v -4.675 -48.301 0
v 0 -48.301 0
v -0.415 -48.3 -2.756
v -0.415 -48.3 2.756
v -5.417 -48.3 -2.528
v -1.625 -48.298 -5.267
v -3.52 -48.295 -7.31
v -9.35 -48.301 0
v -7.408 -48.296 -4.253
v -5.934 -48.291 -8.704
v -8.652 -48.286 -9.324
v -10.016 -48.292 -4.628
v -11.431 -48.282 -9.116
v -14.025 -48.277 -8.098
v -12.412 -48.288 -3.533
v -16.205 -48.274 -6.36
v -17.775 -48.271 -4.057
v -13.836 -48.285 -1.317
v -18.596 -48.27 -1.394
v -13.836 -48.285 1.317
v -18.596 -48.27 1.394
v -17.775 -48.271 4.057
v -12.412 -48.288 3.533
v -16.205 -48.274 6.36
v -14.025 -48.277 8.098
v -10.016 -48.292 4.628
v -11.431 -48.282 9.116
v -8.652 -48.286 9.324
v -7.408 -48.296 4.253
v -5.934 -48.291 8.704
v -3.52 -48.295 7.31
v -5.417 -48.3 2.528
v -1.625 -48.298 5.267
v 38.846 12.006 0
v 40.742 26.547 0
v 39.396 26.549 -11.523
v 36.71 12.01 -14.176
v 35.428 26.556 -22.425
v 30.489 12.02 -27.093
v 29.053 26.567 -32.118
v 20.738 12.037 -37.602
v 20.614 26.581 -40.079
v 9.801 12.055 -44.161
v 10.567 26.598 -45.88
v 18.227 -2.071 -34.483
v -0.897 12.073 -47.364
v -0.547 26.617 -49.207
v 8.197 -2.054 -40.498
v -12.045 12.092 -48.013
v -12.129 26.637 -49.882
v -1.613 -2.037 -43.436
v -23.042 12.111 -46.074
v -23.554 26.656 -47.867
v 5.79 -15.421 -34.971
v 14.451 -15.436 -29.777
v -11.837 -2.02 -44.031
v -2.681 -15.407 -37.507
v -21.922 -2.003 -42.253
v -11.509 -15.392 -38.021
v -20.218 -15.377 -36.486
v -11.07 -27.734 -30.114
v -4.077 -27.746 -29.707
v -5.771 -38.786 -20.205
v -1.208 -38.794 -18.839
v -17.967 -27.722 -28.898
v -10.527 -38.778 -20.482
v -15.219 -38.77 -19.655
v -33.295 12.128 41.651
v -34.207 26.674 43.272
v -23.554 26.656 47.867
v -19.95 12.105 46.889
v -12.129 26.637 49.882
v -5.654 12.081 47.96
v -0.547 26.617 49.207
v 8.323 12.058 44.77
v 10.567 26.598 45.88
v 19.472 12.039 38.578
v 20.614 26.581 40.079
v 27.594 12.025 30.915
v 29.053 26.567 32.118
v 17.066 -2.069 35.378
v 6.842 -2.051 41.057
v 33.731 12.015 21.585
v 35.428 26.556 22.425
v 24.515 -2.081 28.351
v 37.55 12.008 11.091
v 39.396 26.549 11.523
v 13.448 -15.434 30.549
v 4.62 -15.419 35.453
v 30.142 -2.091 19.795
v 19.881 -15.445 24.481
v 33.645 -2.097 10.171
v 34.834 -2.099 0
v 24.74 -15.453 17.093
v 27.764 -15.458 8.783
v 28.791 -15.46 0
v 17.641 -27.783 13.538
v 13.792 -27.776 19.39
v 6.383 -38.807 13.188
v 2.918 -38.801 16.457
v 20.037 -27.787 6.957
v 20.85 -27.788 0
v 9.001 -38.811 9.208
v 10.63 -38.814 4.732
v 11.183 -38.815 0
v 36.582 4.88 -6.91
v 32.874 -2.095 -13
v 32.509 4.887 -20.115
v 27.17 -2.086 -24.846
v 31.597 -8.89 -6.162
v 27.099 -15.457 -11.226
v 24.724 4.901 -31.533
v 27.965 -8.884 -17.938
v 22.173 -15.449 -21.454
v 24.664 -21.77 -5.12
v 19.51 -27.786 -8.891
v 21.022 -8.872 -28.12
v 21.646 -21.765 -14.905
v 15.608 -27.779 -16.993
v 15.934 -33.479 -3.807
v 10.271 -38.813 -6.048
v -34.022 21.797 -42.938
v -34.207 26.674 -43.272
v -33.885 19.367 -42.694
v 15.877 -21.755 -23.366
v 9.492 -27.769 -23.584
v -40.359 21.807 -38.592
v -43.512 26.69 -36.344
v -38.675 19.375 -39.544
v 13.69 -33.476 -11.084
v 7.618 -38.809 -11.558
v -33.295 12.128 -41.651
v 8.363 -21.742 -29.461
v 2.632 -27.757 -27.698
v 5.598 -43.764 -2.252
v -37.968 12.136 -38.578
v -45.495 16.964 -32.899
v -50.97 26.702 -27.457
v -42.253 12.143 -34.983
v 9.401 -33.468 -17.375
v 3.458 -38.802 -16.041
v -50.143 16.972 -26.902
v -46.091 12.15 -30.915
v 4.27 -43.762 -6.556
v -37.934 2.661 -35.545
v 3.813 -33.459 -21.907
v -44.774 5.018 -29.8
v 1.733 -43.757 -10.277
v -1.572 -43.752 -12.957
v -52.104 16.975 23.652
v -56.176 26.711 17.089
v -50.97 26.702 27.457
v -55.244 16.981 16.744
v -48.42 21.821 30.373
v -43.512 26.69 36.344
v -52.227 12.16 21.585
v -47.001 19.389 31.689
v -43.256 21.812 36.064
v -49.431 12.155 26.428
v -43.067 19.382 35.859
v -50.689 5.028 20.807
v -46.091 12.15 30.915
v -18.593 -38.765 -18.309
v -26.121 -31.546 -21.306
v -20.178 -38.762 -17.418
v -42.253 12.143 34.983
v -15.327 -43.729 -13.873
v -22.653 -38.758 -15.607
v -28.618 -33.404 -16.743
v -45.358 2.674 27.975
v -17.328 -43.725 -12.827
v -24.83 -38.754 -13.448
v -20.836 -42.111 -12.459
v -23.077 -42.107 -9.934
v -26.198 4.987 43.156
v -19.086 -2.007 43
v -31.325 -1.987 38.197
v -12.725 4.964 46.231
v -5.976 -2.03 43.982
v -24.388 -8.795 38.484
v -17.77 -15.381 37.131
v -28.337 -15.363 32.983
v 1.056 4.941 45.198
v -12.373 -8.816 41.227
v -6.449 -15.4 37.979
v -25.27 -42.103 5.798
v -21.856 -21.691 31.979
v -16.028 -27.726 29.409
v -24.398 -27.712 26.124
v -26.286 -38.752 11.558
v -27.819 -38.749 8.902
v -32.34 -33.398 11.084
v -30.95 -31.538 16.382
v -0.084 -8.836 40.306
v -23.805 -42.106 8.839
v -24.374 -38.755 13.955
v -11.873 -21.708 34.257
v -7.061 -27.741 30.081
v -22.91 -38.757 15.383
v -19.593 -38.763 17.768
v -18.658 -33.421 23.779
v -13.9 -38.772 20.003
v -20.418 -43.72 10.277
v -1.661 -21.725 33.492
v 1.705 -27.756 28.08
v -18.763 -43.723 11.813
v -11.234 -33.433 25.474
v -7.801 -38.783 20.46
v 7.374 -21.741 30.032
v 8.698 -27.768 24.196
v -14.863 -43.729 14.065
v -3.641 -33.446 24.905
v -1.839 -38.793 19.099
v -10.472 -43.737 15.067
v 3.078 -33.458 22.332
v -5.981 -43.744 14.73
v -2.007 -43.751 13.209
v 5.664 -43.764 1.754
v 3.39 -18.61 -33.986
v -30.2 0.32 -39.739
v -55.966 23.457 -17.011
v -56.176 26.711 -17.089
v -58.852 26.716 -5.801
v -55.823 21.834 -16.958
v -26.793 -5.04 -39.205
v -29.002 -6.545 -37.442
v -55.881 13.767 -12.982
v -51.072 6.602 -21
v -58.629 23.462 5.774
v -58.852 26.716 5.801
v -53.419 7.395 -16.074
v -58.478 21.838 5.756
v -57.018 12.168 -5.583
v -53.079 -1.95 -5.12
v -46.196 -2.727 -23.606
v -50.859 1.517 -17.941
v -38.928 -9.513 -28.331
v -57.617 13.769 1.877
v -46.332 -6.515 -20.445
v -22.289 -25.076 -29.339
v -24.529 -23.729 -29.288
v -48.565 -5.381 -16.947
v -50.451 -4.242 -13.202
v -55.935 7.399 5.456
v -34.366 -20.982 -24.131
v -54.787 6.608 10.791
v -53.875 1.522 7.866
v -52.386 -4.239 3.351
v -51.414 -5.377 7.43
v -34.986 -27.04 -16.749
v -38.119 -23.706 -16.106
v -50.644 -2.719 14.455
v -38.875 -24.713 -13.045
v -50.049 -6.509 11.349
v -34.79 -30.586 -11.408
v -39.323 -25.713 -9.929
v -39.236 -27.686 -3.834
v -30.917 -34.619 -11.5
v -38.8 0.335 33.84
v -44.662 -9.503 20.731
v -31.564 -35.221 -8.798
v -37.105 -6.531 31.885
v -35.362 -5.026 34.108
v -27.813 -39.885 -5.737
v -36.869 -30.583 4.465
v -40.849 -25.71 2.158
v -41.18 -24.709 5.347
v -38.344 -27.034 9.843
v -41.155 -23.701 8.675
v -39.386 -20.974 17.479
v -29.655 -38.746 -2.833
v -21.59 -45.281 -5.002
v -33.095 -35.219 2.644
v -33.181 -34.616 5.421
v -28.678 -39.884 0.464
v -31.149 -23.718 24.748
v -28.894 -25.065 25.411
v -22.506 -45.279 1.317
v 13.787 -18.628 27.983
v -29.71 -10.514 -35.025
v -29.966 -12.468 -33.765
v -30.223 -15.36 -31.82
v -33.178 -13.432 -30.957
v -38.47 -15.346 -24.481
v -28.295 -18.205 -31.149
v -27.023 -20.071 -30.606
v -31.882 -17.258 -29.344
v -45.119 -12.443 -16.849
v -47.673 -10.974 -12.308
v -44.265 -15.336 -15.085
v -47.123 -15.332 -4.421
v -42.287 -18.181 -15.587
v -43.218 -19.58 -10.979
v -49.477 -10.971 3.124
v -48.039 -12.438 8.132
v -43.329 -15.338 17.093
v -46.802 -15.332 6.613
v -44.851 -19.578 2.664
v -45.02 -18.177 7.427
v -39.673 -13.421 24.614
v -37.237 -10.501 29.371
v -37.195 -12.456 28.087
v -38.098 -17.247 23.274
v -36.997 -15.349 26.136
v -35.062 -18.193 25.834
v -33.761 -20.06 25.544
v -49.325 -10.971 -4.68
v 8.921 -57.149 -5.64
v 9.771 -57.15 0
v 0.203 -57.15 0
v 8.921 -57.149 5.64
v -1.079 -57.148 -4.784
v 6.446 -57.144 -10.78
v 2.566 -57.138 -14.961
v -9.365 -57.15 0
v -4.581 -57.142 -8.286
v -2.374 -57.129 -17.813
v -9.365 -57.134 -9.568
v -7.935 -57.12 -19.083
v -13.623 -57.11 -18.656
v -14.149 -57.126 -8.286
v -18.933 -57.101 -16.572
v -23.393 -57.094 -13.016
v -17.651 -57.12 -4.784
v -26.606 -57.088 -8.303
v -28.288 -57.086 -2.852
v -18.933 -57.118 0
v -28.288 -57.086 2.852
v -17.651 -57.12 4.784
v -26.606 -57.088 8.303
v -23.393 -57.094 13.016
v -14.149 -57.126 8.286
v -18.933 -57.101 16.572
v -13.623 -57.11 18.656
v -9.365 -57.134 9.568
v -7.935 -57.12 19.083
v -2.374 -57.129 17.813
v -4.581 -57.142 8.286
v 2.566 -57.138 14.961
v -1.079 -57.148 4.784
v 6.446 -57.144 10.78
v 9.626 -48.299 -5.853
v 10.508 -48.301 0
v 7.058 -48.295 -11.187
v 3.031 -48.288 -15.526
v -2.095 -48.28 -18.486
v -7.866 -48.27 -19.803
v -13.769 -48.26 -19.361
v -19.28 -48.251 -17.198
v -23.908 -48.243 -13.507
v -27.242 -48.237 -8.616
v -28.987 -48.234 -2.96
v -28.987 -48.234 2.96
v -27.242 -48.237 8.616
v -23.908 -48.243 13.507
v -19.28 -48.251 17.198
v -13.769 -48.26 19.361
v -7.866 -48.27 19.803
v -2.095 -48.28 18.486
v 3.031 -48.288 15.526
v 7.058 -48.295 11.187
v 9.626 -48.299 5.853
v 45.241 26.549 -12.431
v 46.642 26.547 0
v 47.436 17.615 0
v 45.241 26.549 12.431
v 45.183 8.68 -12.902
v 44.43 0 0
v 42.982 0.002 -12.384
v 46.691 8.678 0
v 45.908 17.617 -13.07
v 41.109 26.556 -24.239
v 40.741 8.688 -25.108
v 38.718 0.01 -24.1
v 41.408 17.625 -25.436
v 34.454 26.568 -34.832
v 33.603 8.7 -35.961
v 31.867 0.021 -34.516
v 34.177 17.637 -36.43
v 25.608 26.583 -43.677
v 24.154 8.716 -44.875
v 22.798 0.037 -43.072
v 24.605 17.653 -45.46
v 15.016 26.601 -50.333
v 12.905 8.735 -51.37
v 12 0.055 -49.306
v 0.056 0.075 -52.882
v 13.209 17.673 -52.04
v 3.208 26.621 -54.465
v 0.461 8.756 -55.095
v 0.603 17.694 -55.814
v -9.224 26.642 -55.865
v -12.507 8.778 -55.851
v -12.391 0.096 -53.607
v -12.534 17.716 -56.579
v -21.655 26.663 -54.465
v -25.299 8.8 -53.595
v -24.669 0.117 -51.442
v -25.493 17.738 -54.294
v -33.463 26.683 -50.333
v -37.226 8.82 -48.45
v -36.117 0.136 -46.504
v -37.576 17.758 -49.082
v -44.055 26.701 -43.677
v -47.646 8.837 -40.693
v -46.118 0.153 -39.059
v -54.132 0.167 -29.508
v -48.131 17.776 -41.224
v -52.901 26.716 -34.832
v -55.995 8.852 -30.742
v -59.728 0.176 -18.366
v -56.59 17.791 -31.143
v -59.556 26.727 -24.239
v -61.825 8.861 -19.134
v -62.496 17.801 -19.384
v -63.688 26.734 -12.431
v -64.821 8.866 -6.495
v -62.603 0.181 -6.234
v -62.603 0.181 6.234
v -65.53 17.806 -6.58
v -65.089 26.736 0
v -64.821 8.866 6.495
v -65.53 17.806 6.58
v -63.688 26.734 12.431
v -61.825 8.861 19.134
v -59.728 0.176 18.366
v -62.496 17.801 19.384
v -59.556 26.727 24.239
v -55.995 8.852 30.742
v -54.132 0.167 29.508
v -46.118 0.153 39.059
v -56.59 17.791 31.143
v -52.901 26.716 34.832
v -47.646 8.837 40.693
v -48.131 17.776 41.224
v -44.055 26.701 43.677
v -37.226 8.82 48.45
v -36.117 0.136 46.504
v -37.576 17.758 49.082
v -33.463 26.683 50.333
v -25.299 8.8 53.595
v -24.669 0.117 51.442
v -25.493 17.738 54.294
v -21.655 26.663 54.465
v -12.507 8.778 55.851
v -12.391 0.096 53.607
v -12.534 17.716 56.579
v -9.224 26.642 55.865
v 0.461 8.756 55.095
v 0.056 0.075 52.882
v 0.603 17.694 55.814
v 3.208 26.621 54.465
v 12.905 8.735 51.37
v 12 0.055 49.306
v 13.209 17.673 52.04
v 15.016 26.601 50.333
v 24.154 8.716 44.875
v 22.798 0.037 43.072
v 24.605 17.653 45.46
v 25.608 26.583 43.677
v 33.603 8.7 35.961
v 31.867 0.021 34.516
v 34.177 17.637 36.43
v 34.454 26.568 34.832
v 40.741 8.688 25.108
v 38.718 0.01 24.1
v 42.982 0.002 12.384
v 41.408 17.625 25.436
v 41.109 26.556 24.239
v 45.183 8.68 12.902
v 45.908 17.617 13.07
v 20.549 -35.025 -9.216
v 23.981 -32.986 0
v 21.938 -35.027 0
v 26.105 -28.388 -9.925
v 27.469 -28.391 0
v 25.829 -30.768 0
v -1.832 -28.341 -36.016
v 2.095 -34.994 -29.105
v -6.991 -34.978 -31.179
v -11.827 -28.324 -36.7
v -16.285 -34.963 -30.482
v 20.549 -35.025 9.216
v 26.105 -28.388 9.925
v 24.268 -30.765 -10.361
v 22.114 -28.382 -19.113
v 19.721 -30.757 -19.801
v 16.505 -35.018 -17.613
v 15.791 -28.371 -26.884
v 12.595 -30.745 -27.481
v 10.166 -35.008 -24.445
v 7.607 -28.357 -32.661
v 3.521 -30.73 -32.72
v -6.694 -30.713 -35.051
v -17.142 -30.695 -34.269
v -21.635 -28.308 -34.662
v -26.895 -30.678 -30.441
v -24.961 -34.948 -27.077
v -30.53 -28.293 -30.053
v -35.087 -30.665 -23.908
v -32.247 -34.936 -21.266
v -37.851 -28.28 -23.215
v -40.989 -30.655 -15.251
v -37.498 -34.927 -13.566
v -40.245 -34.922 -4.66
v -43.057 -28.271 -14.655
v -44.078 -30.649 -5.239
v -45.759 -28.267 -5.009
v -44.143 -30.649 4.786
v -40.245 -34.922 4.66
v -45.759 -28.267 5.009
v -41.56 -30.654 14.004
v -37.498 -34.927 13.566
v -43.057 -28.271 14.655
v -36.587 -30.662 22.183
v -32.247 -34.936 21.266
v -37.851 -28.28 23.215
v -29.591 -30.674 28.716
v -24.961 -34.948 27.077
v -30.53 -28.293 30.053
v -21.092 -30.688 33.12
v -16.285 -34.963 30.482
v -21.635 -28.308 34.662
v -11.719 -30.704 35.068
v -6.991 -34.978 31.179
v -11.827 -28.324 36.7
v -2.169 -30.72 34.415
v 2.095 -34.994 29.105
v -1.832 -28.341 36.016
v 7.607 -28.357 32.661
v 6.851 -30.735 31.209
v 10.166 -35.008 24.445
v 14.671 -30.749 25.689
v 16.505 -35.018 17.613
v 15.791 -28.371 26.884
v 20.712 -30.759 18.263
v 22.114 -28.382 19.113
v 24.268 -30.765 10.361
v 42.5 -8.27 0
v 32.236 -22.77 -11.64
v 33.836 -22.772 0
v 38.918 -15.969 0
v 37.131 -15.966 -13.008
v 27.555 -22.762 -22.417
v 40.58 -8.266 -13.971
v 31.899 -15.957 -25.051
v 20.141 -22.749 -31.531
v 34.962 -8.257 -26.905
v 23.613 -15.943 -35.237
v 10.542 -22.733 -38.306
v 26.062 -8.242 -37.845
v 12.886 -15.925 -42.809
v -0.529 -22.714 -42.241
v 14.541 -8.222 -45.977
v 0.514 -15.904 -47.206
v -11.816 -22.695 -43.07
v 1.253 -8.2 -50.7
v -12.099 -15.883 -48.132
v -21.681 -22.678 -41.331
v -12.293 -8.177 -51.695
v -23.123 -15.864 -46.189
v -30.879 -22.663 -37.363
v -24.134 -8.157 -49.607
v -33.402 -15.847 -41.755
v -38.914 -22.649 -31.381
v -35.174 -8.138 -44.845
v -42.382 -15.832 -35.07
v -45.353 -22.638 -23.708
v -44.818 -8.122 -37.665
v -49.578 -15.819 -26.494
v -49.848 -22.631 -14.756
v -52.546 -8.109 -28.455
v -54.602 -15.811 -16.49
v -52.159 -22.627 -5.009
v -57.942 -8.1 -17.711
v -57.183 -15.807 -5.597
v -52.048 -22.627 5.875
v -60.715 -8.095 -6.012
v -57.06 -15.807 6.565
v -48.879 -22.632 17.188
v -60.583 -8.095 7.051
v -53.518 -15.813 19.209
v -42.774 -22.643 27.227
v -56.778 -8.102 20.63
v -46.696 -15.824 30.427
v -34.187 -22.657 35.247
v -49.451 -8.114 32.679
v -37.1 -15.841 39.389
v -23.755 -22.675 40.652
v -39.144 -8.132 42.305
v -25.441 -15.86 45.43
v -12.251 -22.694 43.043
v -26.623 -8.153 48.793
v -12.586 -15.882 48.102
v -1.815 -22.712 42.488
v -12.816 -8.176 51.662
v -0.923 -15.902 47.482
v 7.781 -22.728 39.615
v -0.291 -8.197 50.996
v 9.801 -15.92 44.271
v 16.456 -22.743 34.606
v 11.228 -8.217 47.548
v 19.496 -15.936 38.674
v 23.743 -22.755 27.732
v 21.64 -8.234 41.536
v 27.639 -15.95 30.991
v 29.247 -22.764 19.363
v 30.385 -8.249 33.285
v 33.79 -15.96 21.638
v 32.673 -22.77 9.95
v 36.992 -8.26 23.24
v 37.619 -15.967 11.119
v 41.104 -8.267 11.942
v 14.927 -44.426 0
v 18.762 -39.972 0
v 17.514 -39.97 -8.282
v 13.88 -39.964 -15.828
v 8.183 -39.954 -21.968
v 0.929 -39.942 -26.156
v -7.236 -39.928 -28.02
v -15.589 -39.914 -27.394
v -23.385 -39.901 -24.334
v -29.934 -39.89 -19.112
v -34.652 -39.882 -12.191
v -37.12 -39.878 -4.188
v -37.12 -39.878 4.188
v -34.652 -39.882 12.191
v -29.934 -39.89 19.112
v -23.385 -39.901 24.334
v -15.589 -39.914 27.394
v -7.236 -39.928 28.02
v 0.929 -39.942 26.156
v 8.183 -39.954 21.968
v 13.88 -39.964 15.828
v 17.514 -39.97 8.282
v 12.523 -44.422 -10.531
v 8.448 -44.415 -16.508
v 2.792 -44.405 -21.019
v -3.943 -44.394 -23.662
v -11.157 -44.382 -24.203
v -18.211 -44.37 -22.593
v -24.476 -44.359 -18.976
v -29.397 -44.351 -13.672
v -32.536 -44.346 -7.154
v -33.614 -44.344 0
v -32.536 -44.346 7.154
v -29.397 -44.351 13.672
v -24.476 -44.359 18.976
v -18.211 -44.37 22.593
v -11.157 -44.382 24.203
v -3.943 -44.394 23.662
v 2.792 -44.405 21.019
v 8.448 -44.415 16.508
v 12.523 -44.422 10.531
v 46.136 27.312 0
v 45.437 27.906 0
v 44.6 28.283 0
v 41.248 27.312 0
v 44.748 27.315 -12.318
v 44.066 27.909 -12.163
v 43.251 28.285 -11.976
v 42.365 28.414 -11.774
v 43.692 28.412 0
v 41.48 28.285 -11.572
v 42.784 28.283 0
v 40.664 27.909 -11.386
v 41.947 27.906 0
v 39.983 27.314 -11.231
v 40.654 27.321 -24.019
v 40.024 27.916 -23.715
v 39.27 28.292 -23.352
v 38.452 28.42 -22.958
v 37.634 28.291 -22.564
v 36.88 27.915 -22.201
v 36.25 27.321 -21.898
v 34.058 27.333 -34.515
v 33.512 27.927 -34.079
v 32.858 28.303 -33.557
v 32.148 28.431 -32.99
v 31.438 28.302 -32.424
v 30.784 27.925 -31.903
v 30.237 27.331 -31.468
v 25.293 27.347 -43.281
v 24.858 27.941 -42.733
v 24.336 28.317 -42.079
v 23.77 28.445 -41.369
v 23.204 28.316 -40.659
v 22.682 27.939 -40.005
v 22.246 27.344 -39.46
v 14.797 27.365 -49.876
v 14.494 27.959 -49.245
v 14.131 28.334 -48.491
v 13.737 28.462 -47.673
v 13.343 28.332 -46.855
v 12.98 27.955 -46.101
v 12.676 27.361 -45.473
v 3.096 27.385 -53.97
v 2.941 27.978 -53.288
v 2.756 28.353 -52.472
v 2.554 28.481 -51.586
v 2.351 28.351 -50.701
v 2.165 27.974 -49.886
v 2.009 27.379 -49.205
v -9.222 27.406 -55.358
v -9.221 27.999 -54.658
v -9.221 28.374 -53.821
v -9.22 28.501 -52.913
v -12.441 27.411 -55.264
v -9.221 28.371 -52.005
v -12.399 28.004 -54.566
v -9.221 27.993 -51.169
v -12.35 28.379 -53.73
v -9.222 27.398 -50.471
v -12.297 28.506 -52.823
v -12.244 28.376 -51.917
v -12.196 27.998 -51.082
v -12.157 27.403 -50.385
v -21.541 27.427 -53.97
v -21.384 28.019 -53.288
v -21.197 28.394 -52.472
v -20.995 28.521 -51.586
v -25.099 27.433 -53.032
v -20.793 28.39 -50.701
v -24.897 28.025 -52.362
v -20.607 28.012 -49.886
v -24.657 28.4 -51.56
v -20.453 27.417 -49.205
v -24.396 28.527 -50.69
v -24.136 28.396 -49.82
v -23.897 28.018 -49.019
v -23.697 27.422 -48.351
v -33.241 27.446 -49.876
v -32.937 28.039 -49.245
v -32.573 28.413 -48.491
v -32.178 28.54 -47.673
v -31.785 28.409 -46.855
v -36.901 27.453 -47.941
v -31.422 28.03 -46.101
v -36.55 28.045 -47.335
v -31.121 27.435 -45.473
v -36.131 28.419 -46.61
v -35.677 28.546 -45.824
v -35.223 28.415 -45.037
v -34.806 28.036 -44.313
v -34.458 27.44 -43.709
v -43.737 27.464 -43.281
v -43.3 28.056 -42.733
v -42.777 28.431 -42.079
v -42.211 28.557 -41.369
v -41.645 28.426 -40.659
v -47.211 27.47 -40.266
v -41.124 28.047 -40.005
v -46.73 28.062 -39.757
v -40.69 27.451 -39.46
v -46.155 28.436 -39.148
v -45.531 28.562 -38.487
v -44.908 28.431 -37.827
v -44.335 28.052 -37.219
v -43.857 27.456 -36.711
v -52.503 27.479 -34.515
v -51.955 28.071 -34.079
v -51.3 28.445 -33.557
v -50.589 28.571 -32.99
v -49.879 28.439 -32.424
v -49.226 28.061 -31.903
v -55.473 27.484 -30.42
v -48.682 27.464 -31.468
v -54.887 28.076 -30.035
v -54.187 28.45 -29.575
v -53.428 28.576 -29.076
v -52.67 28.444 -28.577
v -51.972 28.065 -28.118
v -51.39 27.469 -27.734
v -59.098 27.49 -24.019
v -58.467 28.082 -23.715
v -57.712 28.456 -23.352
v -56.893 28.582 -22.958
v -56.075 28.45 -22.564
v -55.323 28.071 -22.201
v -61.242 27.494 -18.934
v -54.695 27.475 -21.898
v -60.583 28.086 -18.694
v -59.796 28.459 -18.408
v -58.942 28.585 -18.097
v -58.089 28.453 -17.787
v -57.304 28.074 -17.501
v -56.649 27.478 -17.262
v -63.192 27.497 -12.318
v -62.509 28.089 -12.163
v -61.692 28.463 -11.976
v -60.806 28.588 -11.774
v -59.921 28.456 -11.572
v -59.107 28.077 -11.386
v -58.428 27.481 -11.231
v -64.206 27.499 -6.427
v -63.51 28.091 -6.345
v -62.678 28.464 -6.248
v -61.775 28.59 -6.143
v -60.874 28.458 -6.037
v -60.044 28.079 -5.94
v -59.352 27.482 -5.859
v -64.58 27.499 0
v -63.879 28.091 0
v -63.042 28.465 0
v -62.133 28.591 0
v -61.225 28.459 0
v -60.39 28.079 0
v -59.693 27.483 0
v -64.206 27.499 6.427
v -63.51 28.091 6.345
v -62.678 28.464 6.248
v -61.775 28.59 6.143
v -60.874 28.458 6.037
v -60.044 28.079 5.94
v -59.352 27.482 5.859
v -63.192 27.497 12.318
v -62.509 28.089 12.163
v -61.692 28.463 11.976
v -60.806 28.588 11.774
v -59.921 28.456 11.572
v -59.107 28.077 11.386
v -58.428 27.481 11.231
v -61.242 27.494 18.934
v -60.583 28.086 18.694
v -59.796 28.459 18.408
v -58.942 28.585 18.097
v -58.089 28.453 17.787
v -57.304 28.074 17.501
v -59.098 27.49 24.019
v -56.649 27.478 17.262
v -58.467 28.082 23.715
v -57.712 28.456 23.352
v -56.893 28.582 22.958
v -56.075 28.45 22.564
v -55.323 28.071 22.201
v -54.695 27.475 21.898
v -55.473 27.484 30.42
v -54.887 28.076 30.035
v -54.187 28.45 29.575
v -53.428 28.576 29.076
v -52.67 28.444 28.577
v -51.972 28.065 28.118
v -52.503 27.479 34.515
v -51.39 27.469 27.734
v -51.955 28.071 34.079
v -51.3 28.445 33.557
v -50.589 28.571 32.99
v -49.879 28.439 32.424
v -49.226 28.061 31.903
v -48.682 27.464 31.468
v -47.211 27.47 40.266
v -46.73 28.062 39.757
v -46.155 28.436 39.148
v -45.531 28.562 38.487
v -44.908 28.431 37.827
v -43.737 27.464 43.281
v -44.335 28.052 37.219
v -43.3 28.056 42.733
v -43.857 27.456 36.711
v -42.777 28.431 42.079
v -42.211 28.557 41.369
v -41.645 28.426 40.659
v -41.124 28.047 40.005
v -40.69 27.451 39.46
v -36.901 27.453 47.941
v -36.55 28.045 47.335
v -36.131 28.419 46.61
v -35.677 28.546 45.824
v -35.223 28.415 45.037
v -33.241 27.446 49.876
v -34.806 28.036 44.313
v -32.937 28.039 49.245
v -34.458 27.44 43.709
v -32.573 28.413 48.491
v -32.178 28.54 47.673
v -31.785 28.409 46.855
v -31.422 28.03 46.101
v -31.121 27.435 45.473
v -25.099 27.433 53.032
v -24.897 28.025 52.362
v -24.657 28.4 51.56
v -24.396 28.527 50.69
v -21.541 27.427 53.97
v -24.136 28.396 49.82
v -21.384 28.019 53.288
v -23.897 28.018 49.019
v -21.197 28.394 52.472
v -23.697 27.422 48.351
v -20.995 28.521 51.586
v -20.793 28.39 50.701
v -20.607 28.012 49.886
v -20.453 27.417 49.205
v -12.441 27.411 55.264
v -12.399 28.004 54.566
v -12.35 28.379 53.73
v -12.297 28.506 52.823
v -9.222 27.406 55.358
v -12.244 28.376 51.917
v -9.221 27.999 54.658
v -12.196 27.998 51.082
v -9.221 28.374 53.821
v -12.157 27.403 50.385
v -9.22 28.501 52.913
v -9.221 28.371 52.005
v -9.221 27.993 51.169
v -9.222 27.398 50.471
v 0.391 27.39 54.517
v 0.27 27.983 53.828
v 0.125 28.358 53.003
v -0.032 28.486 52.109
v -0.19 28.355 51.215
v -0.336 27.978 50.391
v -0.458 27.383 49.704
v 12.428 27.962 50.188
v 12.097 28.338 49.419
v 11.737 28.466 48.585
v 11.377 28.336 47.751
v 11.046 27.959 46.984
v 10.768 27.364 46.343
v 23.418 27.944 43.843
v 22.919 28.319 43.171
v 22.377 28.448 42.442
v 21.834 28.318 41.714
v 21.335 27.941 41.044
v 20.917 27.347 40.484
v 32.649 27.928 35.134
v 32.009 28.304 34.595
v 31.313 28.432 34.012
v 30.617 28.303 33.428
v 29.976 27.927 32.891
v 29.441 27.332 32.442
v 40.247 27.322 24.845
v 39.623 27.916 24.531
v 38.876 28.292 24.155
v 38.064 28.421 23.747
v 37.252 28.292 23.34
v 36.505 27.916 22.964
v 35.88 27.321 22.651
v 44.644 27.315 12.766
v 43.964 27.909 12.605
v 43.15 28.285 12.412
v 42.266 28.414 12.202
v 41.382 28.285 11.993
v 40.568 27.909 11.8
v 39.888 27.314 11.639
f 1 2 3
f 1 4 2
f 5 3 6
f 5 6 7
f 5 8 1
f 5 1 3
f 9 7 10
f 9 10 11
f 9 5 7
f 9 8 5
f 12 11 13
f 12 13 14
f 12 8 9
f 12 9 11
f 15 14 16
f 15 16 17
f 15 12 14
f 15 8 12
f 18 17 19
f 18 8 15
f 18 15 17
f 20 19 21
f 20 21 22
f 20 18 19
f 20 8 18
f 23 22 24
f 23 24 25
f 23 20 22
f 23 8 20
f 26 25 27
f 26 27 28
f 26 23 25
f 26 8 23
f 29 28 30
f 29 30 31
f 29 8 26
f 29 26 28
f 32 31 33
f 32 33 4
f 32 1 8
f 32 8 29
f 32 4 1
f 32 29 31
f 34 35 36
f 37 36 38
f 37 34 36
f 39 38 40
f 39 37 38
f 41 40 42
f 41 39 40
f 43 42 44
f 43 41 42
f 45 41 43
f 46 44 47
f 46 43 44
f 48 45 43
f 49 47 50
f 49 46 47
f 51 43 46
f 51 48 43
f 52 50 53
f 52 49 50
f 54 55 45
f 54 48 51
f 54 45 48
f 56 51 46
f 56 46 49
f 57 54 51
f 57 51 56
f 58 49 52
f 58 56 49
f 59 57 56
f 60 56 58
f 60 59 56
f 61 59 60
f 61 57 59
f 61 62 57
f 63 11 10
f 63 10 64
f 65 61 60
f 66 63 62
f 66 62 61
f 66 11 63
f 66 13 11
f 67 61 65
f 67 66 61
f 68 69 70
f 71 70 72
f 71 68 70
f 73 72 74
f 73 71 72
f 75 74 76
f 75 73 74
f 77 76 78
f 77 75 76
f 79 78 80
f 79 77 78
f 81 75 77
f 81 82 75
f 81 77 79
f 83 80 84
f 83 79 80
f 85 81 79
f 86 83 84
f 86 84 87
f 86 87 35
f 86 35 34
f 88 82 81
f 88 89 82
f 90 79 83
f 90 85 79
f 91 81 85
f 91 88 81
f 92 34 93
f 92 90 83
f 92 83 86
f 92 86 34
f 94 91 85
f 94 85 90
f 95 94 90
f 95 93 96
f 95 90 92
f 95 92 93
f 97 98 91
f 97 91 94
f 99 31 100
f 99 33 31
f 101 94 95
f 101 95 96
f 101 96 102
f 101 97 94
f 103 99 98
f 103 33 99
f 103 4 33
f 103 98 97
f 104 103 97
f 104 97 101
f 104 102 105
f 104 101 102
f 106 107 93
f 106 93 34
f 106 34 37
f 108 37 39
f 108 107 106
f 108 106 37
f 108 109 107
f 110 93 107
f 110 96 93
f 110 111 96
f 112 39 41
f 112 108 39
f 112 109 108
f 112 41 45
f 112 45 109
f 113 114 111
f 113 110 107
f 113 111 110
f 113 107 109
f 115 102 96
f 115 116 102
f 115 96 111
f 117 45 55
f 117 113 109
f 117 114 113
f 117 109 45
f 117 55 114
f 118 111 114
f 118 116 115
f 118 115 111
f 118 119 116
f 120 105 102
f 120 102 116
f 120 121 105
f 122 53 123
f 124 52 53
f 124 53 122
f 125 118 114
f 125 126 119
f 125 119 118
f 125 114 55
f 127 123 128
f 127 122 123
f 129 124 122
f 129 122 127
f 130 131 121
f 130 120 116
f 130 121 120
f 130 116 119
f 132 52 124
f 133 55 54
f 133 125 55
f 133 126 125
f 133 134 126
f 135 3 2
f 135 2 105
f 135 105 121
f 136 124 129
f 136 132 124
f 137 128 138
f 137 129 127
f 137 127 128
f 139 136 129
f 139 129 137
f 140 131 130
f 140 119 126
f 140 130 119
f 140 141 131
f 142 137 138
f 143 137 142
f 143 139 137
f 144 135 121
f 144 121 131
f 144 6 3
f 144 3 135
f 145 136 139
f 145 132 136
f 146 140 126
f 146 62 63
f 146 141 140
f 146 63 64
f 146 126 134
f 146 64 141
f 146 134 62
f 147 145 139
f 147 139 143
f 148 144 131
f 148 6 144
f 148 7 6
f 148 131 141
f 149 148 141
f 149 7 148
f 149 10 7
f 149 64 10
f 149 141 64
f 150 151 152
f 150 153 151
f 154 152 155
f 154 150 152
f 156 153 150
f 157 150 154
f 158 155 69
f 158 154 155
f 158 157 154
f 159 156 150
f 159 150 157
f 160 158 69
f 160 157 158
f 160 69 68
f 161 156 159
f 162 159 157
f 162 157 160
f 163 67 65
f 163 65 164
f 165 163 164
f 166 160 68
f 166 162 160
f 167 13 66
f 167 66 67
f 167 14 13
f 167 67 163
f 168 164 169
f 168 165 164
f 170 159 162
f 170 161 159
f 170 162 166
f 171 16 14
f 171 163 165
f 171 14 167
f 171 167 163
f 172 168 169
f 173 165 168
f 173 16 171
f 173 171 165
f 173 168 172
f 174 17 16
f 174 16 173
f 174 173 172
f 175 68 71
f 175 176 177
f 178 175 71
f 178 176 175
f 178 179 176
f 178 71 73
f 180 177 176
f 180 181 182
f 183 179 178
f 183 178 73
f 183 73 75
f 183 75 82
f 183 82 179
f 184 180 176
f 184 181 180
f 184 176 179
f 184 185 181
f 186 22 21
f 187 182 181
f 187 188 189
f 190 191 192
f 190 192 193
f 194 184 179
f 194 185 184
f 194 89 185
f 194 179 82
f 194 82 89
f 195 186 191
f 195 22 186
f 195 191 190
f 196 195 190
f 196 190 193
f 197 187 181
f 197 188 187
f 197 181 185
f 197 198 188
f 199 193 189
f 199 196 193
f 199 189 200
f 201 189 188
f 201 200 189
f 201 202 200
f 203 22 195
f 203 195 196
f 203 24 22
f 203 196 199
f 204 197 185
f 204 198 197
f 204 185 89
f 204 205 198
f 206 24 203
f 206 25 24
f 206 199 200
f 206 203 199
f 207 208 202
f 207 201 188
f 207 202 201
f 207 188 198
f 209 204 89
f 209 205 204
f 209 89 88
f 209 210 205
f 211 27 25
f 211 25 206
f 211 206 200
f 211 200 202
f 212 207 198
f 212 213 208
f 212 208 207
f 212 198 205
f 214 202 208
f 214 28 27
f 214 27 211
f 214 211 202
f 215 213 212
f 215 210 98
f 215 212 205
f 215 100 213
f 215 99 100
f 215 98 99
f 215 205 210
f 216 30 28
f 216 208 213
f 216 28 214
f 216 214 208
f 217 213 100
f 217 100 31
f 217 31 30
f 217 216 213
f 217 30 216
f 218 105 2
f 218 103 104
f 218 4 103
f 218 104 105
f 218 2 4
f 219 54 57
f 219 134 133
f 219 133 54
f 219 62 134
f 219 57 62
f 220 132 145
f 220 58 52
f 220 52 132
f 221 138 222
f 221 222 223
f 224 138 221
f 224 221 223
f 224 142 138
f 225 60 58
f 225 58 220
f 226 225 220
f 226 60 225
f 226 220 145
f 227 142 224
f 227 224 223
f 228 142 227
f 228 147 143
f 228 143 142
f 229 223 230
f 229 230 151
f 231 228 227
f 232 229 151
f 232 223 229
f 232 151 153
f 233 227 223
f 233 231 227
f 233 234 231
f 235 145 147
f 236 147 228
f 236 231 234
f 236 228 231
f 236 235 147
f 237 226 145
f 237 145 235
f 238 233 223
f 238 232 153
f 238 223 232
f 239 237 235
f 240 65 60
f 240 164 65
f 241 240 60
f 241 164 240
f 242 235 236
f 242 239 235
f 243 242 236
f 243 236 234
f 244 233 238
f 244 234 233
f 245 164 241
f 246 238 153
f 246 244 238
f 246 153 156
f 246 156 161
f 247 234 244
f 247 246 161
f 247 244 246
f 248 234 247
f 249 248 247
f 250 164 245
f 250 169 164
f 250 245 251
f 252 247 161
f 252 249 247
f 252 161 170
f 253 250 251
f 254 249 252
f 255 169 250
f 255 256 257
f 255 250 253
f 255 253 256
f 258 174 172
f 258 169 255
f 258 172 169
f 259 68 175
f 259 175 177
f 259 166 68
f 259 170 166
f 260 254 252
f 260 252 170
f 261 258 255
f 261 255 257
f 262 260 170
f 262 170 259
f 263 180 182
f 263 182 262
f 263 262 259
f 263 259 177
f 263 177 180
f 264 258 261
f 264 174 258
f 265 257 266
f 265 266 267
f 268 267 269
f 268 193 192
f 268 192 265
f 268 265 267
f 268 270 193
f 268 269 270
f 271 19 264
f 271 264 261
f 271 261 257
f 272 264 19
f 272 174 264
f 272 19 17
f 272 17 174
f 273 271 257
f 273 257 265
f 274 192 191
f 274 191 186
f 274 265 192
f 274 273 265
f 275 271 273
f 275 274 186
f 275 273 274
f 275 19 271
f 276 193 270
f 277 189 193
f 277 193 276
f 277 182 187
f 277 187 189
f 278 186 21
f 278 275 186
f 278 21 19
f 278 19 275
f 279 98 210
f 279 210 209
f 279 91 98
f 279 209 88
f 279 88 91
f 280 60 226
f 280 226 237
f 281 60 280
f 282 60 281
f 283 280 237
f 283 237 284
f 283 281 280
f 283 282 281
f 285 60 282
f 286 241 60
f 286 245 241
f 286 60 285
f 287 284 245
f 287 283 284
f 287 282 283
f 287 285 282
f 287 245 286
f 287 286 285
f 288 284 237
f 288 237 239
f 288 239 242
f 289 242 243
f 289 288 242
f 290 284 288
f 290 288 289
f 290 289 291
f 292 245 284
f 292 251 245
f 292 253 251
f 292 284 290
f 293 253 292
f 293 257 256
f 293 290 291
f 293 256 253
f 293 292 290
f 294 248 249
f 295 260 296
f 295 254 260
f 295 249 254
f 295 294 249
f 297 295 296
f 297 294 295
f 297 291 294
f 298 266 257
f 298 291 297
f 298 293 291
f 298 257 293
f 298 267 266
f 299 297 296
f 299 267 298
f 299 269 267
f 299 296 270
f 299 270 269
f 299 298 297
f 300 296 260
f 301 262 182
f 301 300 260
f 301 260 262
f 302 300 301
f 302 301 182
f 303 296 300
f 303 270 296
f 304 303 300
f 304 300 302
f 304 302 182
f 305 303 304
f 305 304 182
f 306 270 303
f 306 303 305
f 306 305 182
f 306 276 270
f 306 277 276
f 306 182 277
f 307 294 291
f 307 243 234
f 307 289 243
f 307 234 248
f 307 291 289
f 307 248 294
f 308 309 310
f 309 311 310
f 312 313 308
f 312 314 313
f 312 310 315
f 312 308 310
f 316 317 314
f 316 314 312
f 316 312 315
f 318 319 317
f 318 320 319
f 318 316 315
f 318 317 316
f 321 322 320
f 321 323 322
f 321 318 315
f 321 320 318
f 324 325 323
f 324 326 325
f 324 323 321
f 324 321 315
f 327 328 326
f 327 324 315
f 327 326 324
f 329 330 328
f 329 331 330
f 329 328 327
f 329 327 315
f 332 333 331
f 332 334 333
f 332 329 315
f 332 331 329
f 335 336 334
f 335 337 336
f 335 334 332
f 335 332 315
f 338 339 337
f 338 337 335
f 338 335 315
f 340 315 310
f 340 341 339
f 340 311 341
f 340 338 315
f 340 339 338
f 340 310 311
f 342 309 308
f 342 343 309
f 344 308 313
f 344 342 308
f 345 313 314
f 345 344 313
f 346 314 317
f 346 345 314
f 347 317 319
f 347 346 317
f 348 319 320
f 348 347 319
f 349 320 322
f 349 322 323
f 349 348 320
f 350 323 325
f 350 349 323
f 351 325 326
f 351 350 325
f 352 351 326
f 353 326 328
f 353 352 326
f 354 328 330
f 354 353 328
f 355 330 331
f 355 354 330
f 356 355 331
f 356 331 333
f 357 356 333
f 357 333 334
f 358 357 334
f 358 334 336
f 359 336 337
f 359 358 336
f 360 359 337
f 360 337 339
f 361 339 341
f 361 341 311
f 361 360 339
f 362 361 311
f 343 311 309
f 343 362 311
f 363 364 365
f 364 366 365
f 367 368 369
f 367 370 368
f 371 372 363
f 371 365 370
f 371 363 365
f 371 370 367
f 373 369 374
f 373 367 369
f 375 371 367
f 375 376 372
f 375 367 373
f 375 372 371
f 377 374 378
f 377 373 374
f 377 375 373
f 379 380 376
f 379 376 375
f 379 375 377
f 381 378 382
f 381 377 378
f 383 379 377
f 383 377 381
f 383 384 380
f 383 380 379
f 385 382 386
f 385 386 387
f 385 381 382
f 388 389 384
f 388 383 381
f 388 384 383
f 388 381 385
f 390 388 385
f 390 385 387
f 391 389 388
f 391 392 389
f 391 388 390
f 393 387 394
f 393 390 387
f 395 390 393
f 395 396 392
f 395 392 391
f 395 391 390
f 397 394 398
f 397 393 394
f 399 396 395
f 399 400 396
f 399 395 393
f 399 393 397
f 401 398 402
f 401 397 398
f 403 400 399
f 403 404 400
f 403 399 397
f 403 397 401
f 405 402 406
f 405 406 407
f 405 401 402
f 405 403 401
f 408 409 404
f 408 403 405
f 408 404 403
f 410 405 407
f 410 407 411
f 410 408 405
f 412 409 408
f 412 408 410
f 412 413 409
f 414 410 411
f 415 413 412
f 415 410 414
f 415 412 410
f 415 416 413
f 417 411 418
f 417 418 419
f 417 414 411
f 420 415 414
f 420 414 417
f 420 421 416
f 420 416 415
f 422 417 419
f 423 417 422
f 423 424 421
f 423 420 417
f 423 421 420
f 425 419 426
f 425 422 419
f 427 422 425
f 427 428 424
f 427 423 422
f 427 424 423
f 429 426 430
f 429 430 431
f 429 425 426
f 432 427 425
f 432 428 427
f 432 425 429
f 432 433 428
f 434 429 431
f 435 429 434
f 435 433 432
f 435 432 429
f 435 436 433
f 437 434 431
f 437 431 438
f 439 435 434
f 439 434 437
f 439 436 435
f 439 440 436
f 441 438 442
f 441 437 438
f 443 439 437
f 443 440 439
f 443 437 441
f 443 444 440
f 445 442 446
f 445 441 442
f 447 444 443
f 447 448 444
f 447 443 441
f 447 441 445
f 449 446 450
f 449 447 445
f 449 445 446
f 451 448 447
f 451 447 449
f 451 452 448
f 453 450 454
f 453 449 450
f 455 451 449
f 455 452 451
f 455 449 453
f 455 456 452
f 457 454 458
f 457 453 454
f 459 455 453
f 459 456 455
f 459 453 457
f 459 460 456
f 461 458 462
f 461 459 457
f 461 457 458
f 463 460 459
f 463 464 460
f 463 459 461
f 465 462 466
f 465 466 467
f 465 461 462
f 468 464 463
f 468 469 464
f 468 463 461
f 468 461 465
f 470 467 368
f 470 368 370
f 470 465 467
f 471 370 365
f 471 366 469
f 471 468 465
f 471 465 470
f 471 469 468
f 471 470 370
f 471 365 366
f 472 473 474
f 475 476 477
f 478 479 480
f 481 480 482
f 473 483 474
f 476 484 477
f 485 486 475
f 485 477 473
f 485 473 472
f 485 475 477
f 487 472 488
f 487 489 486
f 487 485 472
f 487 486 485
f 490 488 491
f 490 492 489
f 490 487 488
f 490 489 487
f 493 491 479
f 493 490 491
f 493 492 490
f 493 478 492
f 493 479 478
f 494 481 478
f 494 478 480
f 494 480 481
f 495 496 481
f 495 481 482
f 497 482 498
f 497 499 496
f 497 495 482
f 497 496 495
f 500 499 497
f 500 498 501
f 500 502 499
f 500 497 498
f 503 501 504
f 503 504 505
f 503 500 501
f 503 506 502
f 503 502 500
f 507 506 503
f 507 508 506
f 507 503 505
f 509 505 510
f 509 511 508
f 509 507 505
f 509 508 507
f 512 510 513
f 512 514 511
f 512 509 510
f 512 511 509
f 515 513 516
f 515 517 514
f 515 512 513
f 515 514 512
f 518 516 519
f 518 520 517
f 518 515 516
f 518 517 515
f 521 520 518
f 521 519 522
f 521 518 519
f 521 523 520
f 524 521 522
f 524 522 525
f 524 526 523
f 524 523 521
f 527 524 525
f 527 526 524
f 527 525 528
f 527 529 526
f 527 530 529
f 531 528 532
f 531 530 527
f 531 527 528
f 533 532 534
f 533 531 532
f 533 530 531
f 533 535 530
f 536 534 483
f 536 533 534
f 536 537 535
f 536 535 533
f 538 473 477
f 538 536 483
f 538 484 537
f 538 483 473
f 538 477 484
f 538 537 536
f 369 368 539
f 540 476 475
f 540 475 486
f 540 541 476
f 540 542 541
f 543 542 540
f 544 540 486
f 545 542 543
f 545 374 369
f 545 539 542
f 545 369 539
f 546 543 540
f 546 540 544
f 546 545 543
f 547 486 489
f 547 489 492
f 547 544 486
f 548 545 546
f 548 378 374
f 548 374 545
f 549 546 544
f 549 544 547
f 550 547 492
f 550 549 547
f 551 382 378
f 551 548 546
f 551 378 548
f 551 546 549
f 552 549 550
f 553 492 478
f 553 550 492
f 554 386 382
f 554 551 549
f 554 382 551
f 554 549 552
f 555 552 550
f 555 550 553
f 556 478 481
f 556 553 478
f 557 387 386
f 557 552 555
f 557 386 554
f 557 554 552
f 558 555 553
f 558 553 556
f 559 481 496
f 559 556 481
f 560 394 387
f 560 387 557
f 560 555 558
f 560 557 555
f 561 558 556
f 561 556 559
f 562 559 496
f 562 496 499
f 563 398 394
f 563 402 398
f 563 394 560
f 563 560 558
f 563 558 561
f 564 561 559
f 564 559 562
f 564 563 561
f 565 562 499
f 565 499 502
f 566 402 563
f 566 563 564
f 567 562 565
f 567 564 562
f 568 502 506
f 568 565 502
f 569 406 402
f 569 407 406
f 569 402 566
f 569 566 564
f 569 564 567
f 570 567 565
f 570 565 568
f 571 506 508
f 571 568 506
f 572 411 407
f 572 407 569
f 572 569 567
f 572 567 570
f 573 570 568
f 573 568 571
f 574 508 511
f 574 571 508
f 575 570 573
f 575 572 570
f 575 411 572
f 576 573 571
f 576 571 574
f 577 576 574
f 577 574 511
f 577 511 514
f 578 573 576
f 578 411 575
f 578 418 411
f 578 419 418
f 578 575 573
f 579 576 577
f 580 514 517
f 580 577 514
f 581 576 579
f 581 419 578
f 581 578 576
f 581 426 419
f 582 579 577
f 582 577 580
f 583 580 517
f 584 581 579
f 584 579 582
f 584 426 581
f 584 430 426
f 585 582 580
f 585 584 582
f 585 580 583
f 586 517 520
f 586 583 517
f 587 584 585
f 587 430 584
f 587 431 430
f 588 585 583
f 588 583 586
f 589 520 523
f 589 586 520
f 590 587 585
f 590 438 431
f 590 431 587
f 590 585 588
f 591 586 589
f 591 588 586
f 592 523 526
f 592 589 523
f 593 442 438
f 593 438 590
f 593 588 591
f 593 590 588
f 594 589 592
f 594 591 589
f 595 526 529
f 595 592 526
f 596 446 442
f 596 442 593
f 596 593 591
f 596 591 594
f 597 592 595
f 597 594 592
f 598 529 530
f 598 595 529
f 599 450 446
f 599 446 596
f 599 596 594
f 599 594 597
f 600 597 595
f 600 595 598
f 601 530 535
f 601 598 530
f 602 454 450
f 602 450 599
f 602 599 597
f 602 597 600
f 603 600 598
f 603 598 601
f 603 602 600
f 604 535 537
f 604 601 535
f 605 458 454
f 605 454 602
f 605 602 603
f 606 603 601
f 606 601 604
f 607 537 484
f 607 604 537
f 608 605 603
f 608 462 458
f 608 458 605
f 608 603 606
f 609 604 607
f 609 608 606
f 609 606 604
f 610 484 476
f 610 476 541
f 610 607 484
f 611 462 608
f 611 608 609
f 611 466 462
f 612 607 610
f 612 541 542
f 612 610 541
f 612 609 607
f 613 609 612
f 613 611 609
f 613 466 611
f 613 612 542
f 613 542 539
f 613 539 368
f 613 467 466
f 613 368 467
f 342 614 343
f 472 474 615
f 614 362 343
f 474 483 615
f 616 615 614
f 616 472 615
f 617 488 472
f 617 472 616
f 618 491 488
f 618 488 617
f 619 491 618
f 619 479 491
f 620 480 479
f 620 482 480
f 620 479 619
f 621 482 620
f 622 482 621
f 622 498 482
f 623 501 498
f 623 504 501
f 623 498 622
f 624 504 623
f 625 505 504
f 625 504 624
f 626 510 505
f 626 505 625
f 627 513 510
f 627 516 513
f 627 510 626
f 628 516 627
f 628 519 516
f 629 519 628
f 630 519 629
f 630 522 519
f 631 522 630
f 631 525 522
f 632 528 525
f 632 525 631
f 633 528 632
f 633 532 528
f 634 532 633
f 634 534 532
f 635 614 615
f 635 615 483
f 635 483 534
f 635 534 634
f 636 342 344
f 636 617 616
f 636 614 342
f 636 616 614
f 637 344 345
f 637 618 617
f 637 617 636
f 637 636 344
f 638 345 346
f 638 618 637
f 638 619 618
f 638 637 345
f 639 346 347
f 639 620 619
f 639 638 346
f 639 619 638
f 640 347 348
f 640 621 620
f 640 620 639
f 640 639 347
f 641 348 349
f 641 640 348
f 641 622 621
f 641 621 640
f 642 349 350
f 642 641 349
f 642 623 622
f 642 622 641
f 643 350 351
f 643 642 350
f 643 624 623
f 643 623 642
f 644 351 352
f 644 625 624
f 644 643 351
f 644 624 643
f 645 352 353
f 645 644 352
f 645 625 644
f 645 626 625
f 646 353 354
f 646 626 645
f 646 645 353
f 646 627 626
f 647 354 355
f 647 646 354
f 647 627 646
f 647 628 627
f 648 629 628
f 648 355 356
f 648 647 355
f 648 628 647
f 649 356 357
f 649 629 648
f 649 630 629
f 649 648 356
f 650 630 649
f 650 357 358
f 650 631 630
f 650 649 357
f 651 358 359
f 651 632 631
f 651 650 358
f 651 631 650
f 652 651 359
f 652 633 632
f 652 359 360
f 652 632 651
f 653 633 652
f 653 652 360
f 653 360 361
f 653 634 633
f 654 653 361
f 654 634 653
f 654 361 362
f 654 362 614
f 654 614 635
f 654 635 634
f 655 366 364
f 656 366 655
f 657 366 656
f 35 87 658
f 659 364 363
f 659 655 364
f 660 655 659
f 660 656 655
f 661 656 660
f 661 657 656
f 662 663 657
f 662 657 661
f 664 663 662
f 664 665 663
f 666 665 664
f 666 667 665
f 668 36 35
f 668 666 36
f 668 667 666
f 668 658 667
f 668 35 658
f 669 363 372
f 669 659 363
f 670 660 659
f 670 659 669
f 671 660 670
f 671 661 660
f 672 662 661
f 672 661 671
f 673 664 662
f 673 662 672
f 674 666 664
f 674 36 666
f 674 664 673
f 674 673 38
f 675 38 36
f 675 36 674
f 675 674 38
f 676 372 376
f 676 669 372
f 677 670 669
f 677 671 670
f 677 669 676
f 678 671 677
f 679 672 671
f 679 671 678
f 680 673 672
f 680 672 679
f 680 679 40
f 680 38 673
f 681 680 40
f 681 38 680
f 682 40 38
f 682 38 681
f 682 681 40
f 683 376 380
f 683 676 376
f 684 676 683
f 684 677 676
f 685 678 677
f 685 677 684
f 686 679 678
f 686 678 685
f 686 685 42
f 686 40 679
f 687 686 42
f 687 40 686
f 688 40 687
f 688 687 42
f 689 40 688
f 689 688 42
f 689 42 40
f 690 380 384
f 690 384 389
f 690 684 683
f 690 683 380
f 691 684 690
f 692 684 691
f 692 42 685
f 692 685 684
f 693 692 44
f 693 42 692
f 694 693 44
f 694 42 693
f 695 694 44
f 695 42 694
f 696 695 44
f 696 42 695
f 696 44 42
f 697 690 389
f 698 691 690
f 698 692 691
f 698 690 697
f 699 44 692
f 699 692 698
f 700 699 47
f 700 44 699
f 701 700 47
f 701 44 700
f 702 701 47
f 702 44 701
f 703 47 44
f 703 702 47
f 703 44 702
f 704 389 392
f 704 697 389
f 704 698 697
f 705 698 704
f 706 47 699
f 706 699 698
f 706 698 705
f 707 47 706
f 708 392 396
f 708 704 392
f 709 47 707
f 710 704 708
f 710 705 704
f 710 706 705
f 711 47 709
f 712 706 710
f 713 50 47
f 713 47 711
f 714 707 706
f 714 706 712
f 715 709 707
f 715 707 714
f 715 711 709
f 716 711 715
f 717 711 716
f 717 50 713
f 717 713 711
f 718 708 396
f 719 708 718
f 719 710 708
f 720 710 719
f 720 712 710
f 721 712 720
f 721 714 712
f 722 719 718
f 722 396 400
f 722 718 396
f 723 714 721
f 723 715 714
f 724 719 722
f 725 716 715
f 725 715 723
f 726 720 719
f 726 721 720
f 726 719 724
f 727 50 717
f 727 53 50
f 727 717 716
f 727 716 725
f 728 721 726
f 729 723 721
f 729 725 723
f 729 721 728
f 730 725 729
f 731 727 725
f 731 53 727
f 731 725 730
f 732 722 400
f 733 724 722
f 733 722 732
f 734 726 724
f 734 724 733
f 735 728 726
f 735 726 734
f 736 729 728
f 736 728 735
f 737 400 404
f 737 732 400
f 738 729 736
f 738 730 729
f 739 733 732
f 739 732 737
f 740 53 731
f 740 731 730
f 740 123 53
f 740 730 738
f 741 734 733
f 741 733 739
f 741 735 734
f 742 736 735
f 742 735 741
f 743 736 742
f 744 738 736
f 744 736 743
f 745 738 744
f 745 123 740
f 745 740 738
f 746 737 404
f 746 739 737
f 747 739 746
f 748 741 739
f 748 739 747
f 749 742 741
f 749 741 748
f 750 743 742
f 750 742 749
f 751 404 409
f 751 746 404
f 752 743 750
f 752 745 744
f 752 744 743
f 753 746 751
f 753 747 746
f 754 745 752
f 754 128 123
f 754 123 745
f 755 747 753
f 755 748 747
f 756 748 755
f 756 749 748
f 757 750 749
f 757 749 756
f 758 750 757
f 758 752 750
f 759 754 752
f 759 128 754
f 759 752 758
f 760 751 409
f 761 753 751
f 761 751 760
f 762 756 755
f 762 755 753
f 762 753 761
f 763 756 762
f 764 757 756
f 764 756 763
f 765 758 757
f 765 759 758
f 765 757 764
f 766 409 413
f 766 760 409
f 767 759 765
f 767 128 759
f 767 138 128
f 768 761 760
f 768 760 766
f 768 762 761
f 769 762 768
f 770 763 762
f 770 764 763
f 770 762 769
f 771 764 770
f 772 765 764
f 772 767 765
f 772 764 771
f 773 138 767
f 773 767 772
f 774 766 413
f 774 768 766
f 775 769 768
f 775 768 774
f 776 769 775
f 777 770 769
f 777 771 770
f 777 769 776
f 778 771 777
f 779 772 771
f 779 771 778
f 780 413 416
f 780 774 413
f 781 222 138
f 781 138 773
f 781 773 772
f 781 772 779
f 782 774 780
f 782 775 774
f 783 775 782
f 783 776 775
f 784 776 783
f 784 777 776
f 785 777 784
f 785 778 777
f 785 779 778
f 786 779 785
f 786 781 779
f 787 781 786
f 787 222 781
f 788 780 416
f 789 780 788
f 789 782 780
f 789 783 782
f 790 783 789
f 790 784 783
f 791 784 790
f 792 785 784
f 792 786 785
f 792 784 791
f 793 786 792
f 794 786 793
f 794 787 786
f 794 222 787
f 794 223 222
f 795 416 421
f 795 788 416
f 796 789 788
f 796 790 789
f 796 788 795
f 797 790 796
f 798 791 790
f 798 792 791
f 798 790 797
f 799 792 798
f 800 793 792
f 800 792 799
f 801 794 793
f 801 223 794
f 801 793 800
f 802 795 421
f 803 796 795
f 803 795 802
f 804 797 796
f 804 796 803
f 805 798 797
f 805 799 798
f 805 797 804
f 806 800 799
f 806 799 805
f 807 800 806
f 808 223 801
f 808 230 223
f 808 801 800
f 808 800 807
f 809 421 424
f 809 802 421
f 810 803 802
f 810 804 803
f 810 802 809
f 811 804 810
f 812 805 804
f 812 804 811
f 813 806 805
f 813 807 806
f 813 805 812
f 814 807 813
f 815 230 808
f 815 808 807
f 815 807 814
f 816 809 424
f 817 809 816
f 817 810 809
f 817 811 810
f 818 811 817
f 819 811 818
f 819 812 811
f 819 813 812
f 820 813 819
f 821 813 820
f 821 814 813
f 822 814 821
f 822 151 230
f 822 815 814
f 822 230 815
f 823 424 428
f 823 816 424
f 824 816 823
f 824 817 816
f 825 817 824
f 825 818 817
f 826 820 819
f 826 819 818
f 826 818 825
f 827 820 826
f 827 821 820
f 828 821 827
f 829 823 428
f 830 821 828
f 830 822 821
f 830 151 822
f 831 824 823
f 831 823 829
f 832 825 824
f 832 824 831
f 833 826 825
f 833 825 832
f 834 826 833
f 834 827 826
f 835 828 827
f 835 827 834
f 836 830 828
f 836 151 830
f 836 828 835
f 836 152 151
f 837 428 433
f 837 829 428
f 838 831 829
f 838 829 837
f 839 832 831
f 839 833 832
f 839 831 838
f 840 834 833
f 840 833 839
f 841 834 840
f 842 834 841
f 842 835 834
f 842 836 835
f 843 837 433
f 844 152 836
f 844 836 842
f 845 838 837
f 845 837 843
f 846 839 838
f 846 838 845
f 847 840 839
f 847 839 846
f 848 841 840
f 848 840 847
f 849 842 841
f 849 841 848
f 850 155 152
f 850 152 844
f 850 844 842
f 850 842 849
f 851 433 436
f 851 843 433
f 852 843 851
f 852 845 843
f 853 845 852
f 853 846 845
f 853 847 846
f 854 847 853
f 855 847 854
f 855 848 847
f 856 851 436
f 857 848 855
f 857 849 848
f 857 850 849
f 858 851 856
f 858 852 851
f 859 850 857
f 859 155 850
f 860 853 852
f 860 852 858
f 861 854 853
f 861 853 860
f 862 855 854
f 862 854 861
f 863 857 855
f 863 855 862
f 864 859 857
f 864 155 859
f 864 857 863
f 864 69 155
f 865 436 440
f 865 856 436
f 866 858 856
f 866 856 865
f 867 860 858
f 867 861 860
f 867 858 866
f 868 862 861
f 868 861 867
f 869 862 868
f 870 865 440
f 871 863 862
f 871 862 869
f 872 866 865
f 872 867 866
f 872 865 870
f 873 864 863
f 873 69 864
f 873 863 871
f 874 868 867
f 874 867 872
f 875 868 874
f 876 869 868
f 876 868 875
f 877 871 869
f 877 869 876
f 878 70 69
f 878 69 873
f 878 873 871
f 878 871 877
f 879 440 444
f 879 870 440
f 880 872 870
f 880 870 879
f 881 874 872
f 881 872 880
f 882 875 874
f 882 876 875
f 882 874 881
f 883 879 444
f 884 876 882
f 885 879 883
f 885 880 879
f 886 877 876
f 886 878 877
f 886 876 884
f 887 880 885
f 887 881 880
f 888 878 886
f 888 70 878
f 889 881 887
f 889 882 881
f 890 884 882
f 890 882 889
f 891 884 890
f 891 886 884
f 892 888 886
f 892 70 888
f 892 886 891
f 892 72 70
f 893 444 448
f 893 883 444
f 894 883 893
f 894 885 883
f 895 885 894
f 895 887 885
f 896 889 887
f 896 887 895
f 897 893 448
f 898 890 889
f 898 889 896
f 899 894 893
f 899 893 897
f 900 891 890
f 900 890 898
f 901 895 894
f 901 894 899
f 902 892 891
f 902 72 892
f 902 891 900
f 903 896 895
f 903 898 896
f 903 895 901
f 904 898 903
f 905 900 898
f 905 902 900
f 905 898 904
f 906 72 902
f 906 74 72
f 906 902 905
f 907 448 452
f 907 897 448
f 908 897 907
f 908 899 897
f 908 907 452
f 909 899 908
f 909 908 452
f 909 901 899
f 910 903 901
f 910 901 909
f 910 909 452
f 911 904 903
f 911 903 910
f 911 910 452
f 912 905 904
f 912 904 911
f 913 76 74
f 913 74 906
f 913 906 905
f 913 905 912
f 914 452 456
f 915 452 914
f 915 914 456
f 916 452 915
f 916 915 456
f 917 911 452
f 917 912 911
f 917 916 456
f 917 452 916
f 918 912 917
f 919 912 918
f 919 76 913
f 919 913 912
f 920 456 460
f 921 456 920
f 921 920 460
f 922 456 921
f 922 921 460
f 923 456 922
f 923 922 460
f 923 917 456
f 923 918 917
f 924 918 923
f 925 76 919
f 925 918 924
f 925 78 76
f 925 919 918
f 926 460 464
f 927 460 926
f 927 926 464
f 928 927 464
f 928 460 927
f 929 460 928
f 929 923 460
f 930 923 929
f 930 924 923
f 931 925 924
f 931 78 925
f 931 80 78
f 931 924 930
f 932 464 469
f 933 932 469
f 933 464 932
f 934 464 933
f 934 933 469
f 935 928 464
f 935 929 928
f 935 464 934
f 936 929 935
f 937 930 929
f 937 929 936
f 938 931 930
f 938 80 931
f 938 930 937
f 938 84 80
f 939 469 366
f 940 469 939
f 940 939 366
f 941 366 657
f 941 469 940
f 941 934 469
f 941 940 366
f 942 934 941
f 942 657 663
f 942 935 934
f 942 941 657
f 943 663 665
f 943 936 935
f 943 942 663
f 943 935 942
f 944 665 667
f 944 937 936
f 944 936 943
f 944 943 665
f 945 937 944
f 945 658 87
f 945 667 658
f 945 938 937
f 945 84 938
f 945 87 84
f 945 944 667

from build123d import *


with BuildPart() as f1:
    # F0 (on Top) → F1 (revolve)
    with BuildSketch(Plane.XY):
        with BuildLine():
            ThreePointArc((40.7424159348, 26.5470985323), (28.7908780092, -15.4600545052), (0, -48.3009666204))
            Line((0, -48.3009666204), (5.2541140467, -48.3009666204))
            Line((5.2541140467, -48.3009666204), (10.5082280934, -48.3009666204))
            ThreePointArc((10.5082280934, -48.3009666204), (16.9224125947, -42.2662683671), (21.9382271171, -35.0274182856))
            ThreePointArc((21.9382271171, -35.0274182856), (24.9300335384, -31.8977695262), (27.4688676, -28.3906441182))
            ThreePointArc((27.4688676, -28.3906441182), (38.9184375516, -15.9691578674), (44.4295145571, 0))
            ThreePointArc((44.4295145571, 0), (47.2558696026, 13.130197065), (46.6417744756, 26.5470985323))
            ThreePointArc((46.6417744756, 26.5470985323), (43.6920952052, 28.4115261947), (40.7424159348, 26.5470985323))
        make_face()
        with BuildLine():
            Line((5.2541140467, -48.3009666204), (0, -48.3009666204))
            ThreePointArc((0, -48.3009666204), (-6.2915292503, -50.7102549458), (-9.3645651468, -56.7056249027))
            Line((-9.3645651468, -56.7056249027), (-9.365316964, -57.150002569))
            Line((-9.365316964, -57.150002569), (9.7708059475, -57.150002569))
            Line((9.7708059475, -57.150002569), (10.5082280934, -48.3009666204))
            Line((10.5082280934, -48.3009666204), (5.2541140467, -48.3009666204))
        make_face()
        with BuildLine():
            ThreePointArc((-9.3645651468, -56.7056249027), (-6.2915292503, -50.7102549458), (0, -48.3009666204))
            Line((0, -48.3009666204), (-9.3503457849, -48.3009666204))
            Line((-9.3503457849, -48.3009666204), (-9.3645651468, -56.7056249027))
        make_face()
    revolve(axis=Axis((-9.3281673471, -35.1919260723, 0), (0.0016918405, 0.9999985688, 0)))


solid = f1.part
